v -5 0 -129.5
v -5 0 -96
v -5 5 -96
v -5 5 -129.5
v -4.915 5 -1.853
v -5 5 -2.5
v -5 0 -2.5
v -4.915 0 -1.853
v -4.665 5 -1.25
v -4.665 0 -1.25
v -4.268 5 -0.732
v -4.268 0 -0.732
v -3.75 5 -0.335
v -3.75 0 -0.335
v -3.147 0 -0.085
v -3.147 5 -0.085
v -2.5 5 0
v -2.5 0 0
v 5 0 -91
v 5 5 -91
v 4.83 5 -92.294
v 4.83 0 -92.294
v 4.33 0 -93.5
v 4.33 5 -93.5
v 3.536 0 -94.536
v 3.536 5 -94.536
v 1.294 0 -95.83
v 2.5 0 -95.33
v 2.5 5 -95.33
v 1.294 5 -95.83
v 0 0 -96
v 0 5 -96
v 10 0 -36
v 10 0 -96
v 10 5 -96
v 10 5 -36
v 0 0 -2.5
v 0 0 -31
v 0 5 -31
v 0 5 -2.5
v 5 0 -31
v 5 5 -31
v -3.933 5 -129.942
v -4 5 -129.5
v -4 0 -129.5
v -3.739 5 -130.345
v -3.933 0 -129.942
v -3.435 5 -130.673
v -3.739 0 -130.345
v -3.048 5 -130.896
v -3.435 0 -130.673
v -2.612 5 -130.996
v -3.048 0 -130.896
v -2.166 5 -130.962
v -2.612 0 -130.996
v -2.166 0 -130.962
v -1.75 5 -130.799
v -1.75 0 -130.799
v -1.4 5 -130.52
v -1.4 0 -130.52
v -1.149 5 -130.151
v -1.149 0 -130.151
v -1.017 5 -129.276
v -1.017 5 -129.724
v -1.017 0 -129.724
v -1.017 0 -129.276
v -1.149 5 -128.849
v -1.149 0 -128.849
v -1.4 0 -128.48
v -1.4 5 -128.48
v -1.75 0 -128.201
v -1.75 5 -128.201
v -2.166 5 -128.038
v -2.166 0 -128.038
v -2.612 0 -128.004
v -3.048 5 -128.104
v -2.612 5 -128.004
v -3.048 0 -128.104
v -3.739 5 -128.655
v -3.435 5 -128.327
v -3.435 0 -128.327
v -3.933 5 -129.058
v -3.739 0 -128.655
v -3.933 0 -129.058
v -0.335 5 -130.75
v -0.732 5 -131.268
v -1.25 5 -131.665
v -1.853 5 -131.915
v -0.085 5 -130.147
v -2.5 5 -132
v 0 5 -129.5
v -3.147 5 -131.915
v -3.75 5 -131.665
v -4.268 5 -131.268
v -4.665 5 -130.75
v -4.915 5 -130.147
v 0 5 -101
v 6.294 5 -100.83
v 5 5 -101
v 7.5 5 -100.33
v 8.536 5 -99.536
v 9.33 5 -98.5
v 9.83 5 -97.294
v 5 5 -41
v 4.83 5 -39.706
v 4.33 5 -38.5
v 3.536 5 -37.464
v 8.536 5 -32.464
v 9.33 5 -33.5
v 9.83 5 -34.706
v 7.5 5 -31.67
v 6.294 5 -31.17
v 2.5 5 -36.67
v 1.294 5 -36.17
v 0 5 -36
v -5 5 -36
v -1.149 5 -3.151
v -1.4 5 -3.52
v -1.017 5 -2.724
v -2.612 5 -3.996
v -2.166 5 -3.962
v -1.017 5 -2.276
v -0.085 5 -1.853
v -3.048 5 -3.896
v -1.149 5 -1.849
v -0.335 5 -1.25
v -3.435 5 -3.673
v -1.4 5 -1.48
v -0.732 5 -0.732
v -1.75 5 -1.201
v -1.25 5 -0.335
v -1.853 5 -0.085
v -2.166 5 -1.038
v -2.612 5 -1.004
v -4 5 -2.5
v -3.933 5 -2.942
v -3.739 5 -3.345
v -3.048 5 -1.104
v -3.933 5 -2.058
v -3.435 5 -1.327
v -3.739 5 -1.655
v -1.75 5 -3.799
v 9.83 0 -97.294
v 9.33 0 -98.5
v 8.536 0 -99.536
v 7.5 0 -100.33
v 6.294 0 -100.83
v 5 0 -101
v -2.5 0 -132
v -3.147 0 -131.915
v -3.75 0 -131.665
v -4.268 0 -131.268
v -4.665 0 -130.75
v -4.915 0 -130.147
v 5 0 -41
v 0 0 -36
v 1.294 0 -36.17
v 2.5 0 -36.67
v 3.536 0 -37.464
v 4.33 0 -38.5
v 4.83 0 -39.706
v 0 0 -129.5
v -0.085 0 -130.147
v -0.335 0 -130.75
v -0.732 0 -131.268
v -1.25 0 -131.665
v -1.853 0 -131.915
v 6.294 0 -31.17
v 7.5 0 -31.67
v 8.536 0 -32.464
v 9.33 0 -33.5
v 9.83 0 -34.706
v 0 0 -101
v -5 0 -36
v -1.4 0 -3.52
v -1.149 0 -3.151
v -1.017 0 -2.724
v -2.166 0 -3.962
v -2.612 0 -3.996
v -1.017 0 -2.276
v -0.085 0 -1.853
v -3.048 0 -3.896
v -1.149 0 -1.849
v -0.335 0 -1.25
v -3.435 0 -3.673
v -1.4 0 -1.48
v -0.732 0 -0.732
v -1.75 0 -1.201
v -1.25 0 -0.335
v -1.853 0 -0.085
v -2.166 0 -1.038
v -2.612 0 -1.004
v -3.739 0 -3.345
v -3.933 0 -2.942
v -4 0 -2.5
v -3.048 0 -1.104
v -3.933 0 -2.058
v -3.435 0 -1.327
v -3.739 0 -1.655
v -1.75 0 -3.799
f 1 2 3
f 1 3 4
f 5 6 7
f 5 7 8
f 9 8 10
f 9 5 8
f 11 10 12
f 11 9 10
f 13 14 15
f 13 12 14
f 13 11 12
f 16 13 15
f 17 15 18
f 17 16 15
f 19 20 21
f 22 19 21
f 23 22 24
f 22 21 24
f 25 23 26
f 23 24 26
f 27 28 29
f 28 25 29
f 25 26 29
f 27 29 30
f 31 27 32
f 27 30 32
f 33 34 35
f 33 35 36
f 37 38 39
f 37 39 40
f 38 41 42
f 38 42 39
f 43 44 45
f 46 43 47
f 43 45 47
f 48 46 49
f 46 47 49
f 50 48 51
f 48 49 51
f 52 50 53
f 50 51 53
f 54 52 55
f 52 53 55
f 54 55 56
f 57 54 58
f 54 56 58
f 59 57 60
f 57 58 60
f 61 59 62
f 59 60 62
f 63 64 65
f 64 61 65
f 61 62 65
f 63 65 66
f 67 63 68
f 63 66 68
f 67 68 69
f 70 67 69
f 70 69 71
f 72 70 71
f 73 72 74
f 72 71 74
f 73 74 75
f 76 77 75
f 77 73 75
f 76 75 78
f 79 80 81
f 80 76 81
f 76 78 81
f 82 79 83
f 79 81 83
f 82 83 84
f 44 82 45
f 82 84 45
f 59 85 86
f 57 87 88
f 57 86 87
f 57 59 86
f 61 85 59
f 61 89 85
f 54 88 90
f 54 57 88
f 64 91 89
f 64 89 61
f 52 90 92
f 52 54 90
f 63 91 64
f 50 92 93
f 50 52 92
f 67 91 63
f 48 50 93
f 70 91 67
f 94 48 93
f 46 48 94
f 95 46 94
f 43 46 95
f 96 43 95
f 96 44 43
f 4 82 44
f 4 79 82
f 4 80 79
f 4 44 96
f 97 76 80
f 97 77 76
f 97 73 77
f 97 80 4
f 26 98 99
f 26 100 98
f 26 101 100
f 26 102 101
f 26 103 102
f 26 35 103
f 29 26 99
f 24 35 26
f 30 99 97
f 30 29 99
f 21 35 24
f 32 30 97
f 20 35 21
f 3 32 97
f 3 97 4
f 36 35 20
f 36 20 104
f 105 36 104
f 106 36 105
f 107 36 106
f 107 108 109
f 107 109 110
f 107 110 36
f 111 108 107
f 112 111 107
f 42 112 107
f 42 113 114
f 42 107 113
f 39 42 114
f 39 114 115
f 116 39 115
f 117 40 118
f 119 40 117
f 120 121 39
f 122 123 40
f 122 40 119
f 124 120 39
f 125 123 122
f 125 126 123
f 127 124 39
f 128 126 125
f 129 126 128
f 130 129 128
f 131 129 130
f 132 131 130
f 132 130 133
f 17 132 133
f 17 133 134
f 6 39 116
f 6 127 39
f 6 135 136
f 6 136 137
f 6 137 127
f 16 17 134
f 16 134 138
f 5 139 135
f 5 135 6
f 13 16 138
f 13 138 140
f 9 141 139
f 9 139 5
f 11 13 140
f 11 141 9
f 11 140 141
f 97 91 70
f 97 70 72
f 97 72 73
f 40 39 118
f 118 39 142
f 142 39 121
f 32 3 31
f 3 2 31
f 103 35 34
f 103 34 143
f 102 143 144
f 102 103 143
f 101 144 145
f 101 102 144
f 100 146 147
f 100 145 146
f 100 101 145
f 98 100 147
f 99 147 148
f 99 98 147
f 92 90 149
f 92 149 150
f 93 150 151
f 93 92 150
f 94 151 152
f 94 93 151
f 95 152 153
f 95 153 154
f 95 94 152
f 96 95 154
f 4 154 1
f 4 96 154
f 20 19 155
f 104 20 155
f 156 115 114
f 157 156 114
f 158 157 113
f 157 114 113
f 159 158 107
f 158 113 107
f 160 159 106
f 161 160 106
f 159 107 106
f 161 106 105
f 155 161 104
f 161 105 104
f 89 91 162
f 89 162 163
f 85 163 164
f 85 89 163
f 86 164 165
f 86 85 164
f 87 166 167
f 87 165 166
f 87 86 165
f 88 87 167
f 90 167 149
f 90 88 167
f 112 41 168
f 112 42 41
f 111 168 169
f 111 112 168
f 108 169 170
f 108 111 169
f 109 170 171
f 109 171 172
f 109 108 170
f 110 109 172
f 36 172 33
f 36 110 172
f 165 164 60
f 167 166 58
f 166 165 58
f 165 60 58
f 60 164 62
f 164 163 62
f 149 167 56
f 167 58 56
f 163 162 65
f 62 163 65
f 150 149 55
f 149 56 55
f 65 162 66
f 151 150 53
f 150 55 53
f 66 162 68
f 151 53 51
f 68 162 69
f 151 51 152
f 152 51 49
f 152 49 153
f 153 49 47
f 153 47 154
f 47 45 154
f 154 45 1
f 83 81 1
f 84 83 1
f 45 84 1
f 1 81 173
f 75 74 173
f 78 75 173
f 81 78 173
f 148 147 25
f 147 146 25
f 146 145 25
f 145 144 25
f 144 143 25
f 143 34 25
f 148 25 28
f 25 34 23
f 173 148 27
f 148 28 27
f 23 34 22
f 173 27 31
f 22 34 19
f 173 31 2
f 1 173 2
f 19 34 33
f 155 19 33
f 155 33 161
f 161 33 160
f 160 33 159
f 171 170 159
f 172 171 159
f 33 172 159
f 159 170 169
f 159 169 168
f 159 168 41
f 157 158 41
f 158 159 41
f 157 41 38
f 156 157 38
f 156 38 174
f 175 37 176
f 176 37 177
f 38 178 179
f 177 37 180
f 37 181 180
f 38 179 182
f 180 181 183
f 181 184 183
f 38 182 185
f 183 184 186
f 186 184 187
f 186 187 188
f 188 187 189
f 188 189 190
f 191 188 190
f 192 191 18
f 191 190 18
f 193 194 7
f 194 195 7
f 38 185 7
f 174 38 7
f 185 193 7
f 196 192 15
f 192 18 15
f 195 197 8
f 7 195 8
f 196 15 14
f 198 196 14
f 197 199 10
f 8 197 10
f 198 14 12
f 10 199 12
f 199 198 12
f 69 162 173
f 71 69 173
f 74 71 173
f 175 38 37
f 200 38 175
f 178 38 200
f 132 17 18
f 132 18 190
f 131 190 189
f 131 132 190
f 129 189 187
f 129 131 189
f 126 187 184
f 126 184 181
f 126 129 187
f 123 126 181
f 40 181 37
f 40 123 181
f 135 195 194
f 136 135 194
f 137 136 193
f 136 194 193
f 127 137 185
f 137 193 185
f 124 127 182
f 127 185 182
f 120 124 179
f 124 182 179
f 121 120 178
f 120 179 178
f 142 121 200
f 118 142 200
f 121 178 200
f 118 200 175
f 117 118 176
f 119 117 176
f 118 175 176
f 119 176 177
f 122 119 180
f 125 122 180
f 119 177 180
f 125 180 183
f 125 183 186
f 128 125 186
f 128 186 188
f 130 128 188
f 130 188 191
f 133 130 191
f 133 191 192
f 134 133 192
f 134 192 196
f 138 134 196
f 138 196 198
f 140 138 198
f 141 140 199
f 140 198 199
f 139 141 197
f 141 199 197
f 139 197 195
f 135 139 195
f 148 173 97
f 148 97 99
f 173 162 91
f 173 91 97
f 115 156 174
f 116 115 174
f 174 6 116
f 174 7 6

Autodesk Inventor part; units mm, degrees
ref_plane "YZ Plane" through (0, 0, 0) normal (1, 0, 0) x (0, 1, 0)
ref_plane "XZ Plane" through (0, 0, 0) normal (0, 1, 0) x (-1, 0, 0)
ref_plane "XY Plane" through (0, 0, 0) normal (0, 0, 1) x (1, 0, 0)
sketch "Эскиз1" plane through (0, 0, 0) normal (0, 1, 0) x (-1, 0, 0)
  line L0 (0, 0) -> (5, 0)
  line L1 (5, 0) -> (5, -66)
  line L2 (5, -66) -> (0, -66)
  line L3 (0, -66) -> (0, 0)
  line L4 (2.5, 0) -> (2.5, -2.5)
  circle A0 centre (2.5, -2.5) radius 1.5
  line L5 (0, -66) -> (-10, -66)
  line L6 (-10, -66) -> (-10, -31)
  line L7 (-10, -31) -> (0, -31)
  line L8 (0, -31) -> (0, -66)
  line L9 (5, -66) -> (0, -66)
  line L10 (5, -66) -> (-5, -66)
  line L11 (-5, -66) -> (-5, -36)
  line L12 (-5, -36) -> (5, -36)
  line L13 (5, -36) -> (5, -66)
  point P0 (0, -31)
  point P1 (0, -36)
  point P2 (5, -36)
  dimension "d0" = 5
  dimension "d1" = 66
  dimension "d4" = 2.5
  dimension "d5" = 3
  dimension "d7" = 10
  dimension "d8" = 35
  dimension "d11" = 10
  dimension "d12" = 30
extrude "Выдавливание1" add sketch "Эскиз1" along normal blind 5 contours L0 L1 L12 L3 | L3 L12 L11 L5 L6 L7
fillet "Сопряжение1" radius 2.5 2 edges at (0, 2.5, 0) (-5, 2.5, 0)
fillet "Сопряжение2" radius 5 2 edges at (10, 2.5, -31) (5, 2.5, -36)
mirror "Зеркальное отражение2" about plane through (10, 0, -66) normal (0, 0, -1)
equation "\"d11\" = d7"
equation "\"d12\" = d8 - d0"
properties part number "Балка рулевого управления"
